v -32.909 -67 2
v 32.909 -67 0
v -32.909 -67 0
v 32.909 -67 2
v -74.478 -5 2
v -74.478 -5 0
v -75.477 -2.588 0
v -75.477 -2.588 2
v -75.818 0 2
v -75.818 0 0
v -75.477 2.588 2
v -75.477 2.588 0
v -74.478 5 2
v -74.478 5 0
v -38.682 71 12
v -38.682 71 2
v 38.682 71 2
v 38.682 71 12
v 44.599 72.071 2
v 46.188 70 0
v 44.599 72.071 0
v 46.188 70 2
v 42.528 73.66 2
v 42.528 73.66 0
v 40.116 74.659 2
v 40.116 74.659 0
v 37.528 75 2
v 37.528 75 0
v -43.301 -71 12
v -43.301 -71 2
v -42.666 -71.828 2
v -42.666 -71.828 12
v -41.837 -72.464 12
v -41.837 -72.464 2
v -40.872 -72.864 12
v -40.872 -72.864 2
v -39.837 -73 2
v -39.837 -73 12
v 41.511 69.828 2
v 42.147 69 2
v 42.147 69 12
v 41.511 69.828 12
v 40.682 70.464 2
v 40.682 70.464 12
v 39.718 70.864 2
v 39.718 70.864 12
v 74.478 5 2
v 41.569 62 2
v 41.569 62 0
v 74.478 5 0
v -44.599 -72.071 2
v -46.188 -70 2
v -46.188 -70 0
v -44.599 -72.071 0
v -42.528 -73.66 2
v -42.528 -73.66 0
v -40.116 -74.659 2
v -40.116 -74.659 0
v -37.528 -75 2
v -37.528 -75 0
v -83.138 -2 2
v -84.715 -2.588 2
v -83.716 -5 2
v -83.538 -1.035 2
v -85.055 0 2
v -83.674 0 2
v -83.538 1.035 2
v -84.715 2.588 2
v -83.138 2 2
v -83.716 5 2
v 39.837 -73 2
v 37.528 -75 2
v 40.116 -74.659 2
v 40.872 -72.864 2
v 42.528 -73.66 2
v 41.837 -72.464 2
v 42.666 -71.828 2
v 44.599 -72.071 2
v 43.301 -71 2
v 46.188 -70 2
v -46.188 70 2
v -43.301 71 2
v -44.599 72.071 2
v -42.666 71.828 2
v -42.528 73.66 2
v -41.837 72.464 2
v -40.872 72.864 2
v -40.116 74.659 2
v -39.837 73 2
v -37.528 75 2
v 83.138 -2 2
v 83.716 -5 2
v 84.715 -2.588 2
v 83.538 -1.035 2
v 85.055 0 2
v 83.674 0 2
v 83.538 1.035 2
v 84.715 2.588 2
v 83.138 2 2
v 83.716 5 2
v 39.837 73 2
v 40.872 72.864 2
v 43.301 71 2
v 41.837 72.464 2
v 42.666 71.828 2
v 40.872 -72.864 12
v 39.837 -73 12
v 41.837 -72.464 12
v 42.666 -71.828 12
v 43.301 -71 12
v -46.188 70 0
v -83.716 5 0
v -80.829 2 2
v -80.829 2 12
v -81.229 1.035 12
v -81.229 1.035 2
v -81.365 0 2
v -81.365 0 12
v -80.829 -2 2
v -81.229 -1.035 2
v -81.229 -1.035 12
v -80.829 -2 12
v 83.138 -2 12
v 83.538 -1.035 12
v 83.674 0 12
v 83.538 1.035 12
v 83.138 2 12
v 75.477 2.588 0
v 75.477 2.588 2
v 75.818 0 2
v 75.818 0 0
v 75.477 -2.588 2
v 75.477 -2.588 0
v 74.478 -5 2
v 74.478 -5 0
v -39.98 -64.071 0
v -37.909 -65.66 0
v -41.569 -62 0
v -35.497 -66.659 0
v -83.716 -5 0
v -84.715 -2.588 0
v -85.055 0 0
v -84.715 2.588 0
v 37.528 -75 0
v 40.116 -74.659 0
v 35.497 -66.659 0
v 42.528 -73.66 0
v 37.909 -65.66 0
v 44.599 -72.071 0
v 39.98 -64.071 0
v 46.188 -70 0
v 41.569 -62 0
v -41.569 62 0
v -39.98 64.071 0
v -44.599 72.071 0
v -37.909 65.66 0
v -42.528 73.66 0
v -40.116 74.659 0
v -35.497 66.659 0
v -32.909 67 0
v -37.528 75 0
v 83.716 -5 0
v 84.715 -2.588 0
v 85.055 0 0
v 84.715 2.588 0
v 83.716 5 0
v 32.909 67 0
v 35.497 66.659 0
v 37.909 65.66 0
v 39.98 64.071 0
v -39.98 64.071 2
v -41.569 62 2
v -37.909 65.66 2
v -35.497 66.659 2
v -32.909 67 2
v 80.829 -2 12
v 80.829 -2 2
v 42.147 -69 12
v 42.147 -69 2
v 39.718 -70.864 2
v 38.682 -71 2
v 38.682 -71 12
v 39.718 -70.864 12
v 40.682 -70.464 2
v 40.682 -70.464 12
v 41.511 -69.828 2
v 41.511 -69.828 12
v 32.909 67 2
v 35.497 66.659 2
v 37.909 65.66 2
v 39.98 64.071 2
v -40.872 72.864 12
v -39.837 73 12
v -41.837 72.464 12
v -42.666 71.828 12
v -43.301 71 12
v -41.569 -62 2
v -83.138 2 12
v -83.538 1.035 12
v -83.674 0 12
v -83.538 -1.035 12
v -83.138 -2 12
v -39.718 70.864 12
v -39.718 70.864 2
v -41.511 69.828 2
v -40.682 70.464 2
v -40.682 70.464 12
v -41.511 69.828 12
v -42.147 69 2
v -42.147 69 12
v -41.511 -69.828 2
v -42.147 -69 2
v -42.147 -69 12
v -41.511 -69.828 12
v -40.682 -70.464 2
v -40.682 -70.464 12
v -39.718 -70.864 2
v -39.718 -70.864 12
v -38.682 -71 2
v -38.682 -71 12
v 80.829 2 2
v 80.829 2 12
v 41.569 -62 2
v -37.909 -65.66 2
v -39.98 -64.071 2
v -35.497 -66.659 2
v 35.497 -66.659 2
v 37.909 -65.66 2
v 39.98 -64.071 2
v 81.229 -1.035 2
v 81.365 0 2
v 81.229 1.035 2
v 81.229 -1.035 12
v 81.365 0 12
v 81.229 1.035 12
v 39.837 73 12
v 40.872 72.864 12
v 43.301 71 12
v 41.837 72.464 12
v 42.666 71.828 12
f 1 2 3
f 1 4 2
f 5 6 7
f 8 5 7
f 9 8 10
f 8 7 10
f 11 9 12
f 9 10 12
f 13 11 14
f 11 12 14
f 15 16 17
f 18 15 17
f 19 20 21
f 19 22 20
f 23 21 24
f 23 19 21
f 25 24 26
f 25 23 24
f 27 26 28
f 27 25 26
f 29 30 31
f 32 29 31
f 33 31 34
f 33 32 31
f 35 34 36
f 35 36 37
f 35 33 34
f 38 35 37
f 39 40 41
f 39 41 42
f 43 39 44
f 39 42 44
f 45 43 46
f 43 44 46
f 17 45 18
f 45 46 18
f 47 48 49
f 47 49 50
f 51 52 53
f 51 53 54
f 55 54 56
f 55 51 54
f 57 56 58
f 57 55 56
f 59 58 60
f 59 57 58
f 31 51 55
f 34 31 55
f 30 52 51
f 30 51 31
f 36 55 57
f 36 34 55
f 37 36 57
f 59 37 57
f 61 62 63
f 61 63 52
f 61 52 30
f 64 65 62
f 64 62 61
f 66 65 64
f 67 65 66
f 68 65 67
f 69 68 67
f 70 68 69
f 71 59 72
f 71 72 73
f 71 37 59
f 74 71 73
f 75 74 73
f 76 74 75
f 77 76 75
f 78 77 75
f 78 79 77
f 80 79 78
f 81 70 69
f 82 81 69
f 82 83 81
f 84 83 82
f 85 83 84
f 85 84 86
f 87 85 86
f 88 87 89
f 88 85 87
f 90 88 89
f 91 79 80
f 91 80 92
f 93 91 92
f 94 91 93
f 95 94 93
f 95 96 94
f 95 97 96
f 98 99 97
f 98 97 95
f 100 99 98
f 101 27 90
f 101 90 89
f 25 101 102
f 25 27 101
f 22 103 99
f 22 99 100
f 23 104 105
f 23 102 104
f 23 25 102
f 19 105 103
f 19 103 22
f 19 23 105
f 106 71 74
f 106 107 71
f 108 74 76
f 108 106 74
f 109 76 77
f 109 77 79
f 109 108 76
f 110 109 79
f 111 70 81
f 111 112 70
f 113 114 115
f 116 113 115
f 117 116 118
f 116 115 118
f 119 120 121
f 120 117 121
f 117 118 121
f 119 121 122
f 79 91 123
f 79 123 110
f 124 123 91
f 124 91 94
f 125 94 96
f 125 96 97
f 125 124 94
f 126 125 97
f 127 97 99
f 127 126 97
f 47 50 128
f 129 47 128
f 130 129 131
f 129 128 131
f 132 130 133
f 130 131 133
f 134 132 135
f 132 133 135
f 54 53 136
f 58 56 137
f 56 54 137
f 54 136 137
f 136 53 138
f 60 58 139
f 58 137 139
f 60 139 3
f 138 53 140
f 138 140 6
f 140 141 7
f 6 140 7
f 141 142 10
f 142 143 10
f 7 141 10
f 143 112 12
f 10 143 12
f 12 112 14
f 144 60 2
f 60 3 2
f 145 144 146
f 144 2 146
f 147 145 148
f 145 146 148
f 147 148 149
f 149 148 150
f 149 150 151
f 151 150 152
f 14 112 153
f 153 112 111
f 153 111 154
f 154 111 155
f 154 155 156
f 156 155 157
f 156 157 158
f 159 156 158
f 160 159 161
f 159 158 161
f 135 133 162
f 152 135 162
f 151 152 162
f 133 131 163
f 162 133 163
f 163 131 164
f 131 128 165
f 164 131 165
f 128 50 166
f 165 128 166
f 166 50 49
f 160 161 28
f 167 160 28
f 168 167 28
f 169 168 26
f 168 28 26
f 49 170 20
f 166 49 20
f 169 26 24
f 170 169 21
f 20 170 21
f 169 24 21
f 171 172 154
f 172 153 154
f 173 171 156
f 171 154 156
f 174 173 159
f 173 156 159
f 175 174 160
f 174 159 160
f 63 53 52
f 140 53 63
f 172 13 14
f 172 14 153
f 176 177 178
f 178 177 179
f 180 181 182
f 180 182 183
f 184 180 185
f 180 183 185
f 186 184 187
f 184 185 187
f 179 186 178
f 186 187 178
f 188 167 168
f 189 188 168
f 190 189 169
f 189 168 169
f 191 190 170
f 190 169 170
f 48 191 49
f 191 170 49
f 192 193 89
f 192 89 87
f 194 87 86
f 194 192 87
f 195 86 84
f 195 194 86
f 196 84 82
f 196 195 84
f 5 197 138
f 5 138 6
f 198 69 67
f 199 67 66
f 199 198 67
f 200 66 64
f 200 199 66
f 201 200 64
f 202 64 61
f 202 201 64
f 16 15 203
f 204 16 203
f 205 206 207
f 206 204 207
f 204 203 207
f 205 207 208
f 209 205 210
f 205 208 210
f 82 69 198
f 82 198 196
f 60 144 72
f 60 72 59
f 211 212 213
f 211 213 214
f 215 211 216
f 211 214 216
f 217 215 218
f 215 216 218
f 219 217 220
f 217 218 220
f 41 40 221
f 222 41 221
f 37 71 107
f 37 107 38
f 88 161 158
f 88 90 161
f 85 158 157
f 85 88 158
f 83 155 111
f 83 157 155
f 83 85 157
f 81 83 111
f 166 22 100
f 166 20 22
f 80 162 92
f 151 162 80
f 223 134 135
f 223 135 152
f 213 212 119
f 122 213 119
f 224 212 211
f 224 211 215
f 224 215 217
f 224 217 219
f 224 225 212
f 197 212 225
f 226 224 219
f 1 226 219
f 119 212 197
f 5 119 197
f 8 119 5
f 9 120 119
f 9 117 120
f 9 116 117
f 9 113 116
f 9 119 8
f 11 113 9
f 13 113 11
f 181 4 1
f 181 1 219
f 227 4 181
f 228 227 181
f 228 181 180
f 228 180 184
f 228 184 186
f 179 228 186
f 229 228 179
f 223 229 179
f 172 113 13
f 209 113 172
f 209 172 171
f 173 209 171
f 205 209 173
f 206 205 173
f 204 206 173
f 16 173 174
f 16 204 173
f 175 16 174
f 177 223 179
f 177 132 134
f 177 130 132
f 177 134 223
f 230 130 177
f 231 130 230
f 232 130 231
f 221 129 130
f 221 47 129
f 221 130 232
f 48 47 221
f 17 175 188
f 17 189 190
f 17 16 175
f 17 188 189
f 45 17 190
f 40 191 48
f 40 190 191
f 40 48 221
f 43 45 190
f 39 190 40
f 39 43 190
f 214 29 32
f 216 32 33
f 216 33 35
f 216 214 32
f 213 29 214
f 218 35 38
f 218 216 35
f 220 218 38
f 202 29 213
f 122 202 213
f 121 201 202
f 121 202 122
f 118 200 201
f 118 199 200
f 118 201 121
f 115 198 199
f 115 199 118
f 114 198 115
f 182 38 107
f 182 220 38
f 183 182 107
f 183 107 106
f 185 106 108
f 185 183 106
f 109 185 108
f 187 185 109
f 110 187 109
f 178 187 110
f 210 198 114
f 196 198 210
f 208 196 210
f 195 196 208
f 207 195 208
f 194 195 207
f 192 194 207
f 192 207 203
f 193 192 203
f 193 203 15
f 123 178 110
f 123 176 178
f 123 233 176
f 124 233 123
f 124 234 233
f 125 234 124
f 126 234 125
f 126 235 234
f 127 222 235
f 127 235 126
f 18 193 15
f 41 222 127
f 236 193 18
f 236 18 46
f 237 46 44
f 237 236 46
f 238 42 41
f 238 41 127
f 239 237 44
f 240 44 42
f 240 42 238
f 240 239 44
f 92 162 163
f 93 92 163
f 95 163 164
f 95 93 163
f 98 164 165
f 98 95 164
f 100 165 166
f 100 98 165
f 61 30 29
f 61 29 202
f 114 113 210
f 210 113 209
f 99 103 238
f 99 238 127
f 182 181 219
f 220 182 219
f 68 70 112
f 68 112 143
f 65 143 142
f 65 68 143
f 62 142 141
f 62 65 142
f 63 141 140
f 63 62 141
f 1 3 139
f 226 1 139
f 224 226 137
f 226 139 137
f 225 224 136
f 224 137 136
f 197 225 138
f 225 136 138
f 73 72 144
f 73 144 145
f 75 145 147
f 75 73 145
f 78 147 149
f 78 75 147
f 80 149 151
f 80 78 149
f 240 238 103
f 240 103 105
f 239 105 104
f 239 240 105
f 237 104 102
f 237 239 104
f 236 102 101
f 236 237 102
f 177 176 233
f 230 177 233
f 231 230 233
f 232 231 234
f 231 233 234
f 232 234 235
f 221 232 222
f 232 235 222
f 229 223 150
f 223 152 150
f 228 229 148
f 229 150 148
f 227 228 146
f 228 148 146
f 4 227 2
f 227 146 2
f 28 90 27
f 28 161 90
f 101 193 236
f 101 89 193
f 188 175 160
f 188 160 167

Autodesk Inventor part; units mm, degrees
ref_plane "YZ Plane" through (0, 0, 0) normal (1, 0, 0) x (0, 1, 0)
ref_plane "XZ Plane" through (0, 0, 0) normal (0, 1, 0) x (-1, 0, 0)
ref_plane "XY Plane" through (0, 0, 0) normal (0, 0, 1) x (1, 0, 0)
sketch "Sketch1" plane through (0, 0, 0) normal (0, 0, 1) x (1, 0, 0)
  line L0 (43.3013, -75) -> (-43.3013, -75)
  line L1 (-43.3013, -75) -> (-86.6025, 0)
  line L2 (-86.6025, 0) -> (-43.3013, 75)
  line L3 (-43.3013, 75) -> (43.3013, 75)
  line L4 (43.3013, 75) -> (86.6025, 0)
  line L5 (86.6025, 0) -> (43.3013, -75)
  point P0 (0, 0)
  point P1 (0, 0)
  dimension "d0" = 150
extrude "Extrusion1" add sketch "Sketch1" along normal blind 2
sketch "Sketch5" plane through (0, 0, 2) normal (0, 0, 1) x (1, 0, 0)
  line L0 (-43.3013, -75) -> (43.3013, -75) projected
  line L1 (43.3013, -75) -> (86.6025, 0) projected
  line L2 (86.6025, 0) -> (43.3013, 75) projected
  line L3 (43.3013, 75) -> (-43.3013, 75) projected
  line L4 (-43.3013, 75) -> (-86.6025, 0) projected
  line L5 (-86.6025, 0) -> (-43.3013, -75) projected
  line L6 (-84.2931, 0) -> (-42.1466, 73)
  line L7 (-42.1466, 73) -> (42.1466, 73)
  line L8 (42.1466, 73) -> (84.2931, 0)
  line L9 (84.2931, 0) -> (42.1466, -73)
  line L10 (42.1466, -73) -> (-42.1466, -73)
  line L11 (-42.1466, -73) -> (-84.2931, 0)
  line L12 (-81.9837, 0) -> (-40.9919, 71)
  line L13 (-40.9919, 71) -> (40.9919, 71)
  line L14 (40.9919, 71) -> (81.9837, 0)
  line L15 (81.9837, 0) -> (40.9919, -71)
  line L16 (40.9919, -71) -> (-40.9919, -71)
  line L17 (-40.9919, -71) -> (-81.9837, 0)
  point P0 (0, 0)
  dimension "d15" = 2
  dimension "d16" = 2
extrude "Extrusion5" add sketch "Sketch5" along normal blind 10 contours L6 L7 L8 L9 L10 L11
sketch "Sketch7" plane through (0, 0, 2) normal (0, 0, 1) x (1, 0, 0)
  line L0 (40.9919, 71) -> (-40.9919, 71) projected
  line L1 (-40.9919, 71) -> (-81.9837, 0) projected
  line L2 (-81.9837, 0) -> (-40.9919, -71) projected
  line L3 (-40.9919, -71) -> (40.9919, -71) projected
  line L4 (40.9919, -71) -> (81.9837, 0) projected
  line L5 (81.9837, 0) -> (40.9919, 71) projected
  line L6 (-38.6825, -67) -> (-77.3649, 0)
  line L7 (-77.3649, 0) -> (-38.6825, 67)
  line L8 (-38.6825, 67) -> (38.6825, 67)
  line L9 (38.6825, 67) -> (77.3649, 0)
  line L10 (77.3649, 0) -> (38.6825, -67)
  line L11 (38.6825, -67) -> (-38.6825, -67)
  point P0 (0, 0)
  dimension "d19" = 4
extrude "Extrusion6" cut sketch "Sketch7" against normal blind 7 contours L6 L7 L8 L9 L10 L11
fillet "Fillet1" radius 10 6 edges at (43.3013, 75, 1) (86.6025, 0, 1) (43.3013, -75, 1) (-43.3013, -75, 1) (-86.6025, 0, 1) (-43.3013, 75, 1)
fillet "Fillet1" radius 4 12 edges at (42.1466, -73, 7) (-40.9919, -71, 7) (-84.2931, 0, 7) (-42.1466, 73, 7) (42.1466, 73, 7) (84.2931, 0, 7) (40.9919, -71, 7) (81.9837, 0, 7) (-40.9919, 71, 7) (40.9919, 71, 7) (-42.1466, -73, 7) (-81.9837, 0, 7)
fillet "Fillet2" radius 10 6 edges at (38.6825, -67, 1) (77.3649, 0, 1) (38.6825, 67, 1) (-38.6825, 67, 1) (-77.3649, 0, 1) (-38.6825, -67, 1)
properties part number "Cover v1"
